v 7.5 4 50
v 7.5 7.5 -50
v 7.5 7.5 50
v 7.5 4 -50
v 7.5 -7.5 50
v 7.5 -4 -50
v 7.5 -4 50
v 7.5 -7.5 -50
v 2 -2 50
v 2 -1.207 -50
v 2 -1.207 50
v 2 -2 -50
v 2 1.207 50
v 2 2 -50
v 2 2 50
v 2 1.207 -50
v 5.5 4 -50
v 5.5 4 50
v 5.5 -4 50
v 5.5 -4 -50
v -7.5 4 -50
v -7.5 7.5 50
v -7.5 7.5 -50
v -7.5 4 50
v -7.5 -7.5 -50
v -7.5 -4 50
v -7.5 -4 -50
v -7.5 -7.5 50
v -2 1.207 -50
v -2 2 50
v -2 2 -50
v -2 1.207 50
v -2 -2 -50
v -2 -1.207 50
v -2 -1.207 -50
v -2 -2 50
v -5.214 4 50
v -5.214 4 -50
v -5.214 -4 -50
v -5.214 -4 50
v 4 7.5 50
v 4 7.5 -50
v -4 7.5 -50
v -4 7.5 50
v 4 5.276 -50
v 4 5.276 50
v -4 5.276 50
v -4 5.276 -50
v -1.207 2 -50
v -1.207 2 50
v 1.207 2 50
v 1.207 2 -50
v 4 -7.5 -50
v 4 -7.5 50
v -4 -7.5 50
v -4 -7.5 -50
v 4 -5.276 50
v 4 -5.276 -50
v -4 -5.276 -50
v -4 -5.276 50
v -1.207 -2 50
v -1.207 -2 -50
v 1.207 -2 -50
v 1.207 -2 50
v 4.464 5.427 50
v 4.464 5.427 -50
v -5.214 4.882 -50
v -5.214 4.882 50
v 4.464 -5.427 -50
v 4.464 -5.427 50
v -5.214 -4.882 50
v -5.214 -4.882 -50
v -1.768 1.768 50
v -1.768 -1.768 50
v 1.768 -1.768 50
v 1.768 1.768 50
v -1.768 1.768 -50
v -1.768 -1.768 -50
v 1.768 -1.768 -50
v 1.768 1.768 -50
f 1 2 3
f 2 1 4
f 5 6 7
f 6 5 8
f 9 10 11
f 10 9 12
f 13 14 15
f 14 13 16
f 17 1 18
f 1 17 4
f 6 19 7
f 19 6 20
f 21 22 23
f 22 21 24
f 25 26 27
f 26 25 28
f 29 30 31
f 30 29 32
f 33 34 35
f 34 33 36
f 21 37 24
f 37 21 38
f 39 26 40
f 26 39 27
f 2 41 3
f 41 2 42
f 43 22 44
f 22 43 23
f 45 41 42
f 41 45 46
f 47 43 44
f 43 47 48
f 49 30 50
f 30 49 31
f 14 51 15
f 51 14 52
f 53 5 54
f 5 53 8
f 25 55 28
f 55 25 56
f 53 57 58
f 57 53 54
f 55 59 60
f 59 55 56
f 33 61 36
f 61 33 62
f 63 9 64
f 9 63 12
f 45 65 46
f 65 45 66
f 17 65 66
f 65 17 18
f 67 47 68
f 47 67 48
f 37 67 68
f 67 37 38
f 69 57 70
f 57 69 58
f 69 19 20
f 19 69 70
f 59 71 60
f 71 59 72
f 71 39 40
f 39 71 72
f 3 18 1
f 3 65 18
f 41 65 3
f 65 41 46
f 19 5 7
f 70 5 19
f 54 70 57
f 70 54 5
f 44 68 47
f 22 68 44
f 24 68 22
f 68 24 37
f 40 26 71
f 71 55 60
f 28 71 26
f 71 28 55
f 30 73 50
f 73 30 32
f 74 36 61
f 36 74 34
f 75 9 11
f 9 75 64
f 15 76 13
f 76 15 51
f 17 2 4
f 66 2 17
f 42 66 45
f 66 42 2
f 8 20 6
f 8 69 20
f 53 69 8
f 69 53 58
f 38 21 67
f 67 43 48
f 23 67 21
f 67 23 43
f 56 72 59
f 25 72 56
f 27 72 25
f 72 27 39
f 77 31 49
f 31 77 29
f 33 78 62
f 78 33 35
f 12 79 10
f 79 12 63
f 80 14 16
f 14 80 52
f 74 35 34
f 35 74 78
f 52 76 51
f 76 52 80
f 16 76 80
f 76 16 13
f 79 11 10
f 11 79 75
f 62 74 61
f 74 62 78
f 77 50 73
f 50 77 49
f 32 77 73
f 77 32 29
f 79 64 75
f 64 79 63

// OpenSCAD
// Parameters
cross_section_width = 15; //[7.5:30:0.5]
cross_section_height = 15; //[7.5:30:0.5]
length = 100; //[50:200:1]
center = 1; //[0:1:1]
cornerHole = 1; //[0:1:1]
wall_thickness = 2.0; //[1.0:4.0:0.25]
slot_opening_width = 6.0; //[3.0:10.0:0.25]
slot_inner_width = 8.0; //[4.0:12.0:0.25]
slot_depth = 4.5; //[2.0:7.0:0.25]
slot_neck_depth = 1.8; //[0.8:3.5:0.1]
center_bore_diameter = 5.0; //[2.0:10.0:0.25]
corner_hole_diameter_base = 3.0; //[1.5:6.0:0.25]
corner_hole_inset = 3.5; //[2.0:6.0:0.25]
overlap = 1.0; //[0.5:2.0:0.25]

// Extrusion Profile Body
module extrusion_profile_body() {
  color("Silver") {
    cube([cross_section_width, cross_section_height, length], center=true);
  }
}

// T-Slot Channels
module t_slot_channels() {
  union() {
    translate([cross_section_width/2 - (slot_neck_depth + overlap)/2, 0, 0])
      cube([slot_neck_depth + overlap, slot_opening_width, length + 2*overlap], center=true);
    translate([cross_section_width/2 - (slot_depth + overlap)/2, 0, 0])
      cube([slot_depth + overlap, slot_inner_width, length + 2*overlap], center=true);
    translate([-cross_section_width/2 + (slot_neck_depth + overlap)/2, 0, 0])
      cube([slot_neck_depth + overlap, slot_opening_width, length + 2*overlap], center=true);
    translate([-cross_section_width/2 + (slot_depth + overlap)/2, 0, 0])
      cube([slot_depth + overlap, slot_inner_width, length + 2*overlap], center=true);
    translate([0, cross_section_height/2 - (slot_neck_depth + overlap)/2, 0])
      cube([slot_opening_width, slot_neck_depth + overlap, length + 2*overlap], center=true);
    translate([0, cross_section_height/2 - (slot_depth + overlap)/2, 0])
      cube([slot_inner_width, slot_depth + overlap, length + 2*overlap], center=true);
    translate([0, -cross_section_height/2 + (slot_neck_depth + overlap)/2, 0])
      cube([slot_opening_width, slot_neck_depth + overlap, length + 2*overlap], center=true);
    translate([0, -cross_section_height/2 + (slot_depth + overlap)/2, 0])
      cube([slot_inner_width, slot_depth + overlap, length + 2*overlap], center=true);
  }
}

// Center Bore
module center_bore() {
  color("Black") {
    cylinder(r=center_bore_diameter/2, h=length + 2*overlap, center=true);
  }
}

// Corner Holes
module corner_holes() {
  if (cornerHole) {
    union() {
      translate([cross_section_width/2 - corner_hole_inset, cross_section_height/2 - corner_hole_inset, 0])
        cylinder(r=(corner_hole_diameter_base*cornerHole)/2, h=length + 2*overlap, center=true);
      translate([-cross_section_width/2 + corner_hole_inset, cross_section_height/2 - corner_hole_inset, 0])
        cylinder(r=(corner_hole_diameter_base*cornerHole)/2, h=length + 2*overlap, center=true);
      translate([cross_section_width/2 - corner_hole_inset, -cross_section_height/2 + corner_hole_inset, 0])
        cylinder(r=(corner_hole_diameter_base*cornerHole)/2, h=length + 2*overlap, center=true);
      translate([-cross_section_width/2 + corner_hole_inset, -cross_section_height/2 + corner_hole_inset, 0])
        cylinder(r=(corner_hole_diameter_base*cornerHole)/2, h=length + 2*overlap, center=true);
    }
  }
}

// Box Corner Profile Section
module box_corner_profile_section() {
  color("DimGray") {
    translate([cross_section_width/2 - wall_thickness/2, cross_section_height/2 - wall_thickness/2, 0])
      cube([wall_thickness, wall_thickness, length], center=true);
  }
}

// Box Corner Profile Sections
module box_corner_profile_sections() {
  union() {
    box_corner_profile_section();
    translate([-cross_section_width + wall_thickness, 0, 0]) box_corner_profile_section();
    translate([0, -cross_section_height + wall_thickness, 0]) box_corner_profile_section();
    translate([-cross_section_width + wall_thickness, -cross_section_height + wall_thickness, 0]) box_corner_profile_section();
  }
}

// Extrusion Cross Section
module extrusion_cross_section() {
  difference() {
    extrusion_profile_body();
    t_slot_channels();
    center_bore();
    corner_holes();
  }
}

// Extrusion
module extrusion() {
  union() {
    extrusion_cross_section();
    box_corner_profile_sections();
  }
}

// Assembly
module assembly() {
  extrusion();
}

assembly();
